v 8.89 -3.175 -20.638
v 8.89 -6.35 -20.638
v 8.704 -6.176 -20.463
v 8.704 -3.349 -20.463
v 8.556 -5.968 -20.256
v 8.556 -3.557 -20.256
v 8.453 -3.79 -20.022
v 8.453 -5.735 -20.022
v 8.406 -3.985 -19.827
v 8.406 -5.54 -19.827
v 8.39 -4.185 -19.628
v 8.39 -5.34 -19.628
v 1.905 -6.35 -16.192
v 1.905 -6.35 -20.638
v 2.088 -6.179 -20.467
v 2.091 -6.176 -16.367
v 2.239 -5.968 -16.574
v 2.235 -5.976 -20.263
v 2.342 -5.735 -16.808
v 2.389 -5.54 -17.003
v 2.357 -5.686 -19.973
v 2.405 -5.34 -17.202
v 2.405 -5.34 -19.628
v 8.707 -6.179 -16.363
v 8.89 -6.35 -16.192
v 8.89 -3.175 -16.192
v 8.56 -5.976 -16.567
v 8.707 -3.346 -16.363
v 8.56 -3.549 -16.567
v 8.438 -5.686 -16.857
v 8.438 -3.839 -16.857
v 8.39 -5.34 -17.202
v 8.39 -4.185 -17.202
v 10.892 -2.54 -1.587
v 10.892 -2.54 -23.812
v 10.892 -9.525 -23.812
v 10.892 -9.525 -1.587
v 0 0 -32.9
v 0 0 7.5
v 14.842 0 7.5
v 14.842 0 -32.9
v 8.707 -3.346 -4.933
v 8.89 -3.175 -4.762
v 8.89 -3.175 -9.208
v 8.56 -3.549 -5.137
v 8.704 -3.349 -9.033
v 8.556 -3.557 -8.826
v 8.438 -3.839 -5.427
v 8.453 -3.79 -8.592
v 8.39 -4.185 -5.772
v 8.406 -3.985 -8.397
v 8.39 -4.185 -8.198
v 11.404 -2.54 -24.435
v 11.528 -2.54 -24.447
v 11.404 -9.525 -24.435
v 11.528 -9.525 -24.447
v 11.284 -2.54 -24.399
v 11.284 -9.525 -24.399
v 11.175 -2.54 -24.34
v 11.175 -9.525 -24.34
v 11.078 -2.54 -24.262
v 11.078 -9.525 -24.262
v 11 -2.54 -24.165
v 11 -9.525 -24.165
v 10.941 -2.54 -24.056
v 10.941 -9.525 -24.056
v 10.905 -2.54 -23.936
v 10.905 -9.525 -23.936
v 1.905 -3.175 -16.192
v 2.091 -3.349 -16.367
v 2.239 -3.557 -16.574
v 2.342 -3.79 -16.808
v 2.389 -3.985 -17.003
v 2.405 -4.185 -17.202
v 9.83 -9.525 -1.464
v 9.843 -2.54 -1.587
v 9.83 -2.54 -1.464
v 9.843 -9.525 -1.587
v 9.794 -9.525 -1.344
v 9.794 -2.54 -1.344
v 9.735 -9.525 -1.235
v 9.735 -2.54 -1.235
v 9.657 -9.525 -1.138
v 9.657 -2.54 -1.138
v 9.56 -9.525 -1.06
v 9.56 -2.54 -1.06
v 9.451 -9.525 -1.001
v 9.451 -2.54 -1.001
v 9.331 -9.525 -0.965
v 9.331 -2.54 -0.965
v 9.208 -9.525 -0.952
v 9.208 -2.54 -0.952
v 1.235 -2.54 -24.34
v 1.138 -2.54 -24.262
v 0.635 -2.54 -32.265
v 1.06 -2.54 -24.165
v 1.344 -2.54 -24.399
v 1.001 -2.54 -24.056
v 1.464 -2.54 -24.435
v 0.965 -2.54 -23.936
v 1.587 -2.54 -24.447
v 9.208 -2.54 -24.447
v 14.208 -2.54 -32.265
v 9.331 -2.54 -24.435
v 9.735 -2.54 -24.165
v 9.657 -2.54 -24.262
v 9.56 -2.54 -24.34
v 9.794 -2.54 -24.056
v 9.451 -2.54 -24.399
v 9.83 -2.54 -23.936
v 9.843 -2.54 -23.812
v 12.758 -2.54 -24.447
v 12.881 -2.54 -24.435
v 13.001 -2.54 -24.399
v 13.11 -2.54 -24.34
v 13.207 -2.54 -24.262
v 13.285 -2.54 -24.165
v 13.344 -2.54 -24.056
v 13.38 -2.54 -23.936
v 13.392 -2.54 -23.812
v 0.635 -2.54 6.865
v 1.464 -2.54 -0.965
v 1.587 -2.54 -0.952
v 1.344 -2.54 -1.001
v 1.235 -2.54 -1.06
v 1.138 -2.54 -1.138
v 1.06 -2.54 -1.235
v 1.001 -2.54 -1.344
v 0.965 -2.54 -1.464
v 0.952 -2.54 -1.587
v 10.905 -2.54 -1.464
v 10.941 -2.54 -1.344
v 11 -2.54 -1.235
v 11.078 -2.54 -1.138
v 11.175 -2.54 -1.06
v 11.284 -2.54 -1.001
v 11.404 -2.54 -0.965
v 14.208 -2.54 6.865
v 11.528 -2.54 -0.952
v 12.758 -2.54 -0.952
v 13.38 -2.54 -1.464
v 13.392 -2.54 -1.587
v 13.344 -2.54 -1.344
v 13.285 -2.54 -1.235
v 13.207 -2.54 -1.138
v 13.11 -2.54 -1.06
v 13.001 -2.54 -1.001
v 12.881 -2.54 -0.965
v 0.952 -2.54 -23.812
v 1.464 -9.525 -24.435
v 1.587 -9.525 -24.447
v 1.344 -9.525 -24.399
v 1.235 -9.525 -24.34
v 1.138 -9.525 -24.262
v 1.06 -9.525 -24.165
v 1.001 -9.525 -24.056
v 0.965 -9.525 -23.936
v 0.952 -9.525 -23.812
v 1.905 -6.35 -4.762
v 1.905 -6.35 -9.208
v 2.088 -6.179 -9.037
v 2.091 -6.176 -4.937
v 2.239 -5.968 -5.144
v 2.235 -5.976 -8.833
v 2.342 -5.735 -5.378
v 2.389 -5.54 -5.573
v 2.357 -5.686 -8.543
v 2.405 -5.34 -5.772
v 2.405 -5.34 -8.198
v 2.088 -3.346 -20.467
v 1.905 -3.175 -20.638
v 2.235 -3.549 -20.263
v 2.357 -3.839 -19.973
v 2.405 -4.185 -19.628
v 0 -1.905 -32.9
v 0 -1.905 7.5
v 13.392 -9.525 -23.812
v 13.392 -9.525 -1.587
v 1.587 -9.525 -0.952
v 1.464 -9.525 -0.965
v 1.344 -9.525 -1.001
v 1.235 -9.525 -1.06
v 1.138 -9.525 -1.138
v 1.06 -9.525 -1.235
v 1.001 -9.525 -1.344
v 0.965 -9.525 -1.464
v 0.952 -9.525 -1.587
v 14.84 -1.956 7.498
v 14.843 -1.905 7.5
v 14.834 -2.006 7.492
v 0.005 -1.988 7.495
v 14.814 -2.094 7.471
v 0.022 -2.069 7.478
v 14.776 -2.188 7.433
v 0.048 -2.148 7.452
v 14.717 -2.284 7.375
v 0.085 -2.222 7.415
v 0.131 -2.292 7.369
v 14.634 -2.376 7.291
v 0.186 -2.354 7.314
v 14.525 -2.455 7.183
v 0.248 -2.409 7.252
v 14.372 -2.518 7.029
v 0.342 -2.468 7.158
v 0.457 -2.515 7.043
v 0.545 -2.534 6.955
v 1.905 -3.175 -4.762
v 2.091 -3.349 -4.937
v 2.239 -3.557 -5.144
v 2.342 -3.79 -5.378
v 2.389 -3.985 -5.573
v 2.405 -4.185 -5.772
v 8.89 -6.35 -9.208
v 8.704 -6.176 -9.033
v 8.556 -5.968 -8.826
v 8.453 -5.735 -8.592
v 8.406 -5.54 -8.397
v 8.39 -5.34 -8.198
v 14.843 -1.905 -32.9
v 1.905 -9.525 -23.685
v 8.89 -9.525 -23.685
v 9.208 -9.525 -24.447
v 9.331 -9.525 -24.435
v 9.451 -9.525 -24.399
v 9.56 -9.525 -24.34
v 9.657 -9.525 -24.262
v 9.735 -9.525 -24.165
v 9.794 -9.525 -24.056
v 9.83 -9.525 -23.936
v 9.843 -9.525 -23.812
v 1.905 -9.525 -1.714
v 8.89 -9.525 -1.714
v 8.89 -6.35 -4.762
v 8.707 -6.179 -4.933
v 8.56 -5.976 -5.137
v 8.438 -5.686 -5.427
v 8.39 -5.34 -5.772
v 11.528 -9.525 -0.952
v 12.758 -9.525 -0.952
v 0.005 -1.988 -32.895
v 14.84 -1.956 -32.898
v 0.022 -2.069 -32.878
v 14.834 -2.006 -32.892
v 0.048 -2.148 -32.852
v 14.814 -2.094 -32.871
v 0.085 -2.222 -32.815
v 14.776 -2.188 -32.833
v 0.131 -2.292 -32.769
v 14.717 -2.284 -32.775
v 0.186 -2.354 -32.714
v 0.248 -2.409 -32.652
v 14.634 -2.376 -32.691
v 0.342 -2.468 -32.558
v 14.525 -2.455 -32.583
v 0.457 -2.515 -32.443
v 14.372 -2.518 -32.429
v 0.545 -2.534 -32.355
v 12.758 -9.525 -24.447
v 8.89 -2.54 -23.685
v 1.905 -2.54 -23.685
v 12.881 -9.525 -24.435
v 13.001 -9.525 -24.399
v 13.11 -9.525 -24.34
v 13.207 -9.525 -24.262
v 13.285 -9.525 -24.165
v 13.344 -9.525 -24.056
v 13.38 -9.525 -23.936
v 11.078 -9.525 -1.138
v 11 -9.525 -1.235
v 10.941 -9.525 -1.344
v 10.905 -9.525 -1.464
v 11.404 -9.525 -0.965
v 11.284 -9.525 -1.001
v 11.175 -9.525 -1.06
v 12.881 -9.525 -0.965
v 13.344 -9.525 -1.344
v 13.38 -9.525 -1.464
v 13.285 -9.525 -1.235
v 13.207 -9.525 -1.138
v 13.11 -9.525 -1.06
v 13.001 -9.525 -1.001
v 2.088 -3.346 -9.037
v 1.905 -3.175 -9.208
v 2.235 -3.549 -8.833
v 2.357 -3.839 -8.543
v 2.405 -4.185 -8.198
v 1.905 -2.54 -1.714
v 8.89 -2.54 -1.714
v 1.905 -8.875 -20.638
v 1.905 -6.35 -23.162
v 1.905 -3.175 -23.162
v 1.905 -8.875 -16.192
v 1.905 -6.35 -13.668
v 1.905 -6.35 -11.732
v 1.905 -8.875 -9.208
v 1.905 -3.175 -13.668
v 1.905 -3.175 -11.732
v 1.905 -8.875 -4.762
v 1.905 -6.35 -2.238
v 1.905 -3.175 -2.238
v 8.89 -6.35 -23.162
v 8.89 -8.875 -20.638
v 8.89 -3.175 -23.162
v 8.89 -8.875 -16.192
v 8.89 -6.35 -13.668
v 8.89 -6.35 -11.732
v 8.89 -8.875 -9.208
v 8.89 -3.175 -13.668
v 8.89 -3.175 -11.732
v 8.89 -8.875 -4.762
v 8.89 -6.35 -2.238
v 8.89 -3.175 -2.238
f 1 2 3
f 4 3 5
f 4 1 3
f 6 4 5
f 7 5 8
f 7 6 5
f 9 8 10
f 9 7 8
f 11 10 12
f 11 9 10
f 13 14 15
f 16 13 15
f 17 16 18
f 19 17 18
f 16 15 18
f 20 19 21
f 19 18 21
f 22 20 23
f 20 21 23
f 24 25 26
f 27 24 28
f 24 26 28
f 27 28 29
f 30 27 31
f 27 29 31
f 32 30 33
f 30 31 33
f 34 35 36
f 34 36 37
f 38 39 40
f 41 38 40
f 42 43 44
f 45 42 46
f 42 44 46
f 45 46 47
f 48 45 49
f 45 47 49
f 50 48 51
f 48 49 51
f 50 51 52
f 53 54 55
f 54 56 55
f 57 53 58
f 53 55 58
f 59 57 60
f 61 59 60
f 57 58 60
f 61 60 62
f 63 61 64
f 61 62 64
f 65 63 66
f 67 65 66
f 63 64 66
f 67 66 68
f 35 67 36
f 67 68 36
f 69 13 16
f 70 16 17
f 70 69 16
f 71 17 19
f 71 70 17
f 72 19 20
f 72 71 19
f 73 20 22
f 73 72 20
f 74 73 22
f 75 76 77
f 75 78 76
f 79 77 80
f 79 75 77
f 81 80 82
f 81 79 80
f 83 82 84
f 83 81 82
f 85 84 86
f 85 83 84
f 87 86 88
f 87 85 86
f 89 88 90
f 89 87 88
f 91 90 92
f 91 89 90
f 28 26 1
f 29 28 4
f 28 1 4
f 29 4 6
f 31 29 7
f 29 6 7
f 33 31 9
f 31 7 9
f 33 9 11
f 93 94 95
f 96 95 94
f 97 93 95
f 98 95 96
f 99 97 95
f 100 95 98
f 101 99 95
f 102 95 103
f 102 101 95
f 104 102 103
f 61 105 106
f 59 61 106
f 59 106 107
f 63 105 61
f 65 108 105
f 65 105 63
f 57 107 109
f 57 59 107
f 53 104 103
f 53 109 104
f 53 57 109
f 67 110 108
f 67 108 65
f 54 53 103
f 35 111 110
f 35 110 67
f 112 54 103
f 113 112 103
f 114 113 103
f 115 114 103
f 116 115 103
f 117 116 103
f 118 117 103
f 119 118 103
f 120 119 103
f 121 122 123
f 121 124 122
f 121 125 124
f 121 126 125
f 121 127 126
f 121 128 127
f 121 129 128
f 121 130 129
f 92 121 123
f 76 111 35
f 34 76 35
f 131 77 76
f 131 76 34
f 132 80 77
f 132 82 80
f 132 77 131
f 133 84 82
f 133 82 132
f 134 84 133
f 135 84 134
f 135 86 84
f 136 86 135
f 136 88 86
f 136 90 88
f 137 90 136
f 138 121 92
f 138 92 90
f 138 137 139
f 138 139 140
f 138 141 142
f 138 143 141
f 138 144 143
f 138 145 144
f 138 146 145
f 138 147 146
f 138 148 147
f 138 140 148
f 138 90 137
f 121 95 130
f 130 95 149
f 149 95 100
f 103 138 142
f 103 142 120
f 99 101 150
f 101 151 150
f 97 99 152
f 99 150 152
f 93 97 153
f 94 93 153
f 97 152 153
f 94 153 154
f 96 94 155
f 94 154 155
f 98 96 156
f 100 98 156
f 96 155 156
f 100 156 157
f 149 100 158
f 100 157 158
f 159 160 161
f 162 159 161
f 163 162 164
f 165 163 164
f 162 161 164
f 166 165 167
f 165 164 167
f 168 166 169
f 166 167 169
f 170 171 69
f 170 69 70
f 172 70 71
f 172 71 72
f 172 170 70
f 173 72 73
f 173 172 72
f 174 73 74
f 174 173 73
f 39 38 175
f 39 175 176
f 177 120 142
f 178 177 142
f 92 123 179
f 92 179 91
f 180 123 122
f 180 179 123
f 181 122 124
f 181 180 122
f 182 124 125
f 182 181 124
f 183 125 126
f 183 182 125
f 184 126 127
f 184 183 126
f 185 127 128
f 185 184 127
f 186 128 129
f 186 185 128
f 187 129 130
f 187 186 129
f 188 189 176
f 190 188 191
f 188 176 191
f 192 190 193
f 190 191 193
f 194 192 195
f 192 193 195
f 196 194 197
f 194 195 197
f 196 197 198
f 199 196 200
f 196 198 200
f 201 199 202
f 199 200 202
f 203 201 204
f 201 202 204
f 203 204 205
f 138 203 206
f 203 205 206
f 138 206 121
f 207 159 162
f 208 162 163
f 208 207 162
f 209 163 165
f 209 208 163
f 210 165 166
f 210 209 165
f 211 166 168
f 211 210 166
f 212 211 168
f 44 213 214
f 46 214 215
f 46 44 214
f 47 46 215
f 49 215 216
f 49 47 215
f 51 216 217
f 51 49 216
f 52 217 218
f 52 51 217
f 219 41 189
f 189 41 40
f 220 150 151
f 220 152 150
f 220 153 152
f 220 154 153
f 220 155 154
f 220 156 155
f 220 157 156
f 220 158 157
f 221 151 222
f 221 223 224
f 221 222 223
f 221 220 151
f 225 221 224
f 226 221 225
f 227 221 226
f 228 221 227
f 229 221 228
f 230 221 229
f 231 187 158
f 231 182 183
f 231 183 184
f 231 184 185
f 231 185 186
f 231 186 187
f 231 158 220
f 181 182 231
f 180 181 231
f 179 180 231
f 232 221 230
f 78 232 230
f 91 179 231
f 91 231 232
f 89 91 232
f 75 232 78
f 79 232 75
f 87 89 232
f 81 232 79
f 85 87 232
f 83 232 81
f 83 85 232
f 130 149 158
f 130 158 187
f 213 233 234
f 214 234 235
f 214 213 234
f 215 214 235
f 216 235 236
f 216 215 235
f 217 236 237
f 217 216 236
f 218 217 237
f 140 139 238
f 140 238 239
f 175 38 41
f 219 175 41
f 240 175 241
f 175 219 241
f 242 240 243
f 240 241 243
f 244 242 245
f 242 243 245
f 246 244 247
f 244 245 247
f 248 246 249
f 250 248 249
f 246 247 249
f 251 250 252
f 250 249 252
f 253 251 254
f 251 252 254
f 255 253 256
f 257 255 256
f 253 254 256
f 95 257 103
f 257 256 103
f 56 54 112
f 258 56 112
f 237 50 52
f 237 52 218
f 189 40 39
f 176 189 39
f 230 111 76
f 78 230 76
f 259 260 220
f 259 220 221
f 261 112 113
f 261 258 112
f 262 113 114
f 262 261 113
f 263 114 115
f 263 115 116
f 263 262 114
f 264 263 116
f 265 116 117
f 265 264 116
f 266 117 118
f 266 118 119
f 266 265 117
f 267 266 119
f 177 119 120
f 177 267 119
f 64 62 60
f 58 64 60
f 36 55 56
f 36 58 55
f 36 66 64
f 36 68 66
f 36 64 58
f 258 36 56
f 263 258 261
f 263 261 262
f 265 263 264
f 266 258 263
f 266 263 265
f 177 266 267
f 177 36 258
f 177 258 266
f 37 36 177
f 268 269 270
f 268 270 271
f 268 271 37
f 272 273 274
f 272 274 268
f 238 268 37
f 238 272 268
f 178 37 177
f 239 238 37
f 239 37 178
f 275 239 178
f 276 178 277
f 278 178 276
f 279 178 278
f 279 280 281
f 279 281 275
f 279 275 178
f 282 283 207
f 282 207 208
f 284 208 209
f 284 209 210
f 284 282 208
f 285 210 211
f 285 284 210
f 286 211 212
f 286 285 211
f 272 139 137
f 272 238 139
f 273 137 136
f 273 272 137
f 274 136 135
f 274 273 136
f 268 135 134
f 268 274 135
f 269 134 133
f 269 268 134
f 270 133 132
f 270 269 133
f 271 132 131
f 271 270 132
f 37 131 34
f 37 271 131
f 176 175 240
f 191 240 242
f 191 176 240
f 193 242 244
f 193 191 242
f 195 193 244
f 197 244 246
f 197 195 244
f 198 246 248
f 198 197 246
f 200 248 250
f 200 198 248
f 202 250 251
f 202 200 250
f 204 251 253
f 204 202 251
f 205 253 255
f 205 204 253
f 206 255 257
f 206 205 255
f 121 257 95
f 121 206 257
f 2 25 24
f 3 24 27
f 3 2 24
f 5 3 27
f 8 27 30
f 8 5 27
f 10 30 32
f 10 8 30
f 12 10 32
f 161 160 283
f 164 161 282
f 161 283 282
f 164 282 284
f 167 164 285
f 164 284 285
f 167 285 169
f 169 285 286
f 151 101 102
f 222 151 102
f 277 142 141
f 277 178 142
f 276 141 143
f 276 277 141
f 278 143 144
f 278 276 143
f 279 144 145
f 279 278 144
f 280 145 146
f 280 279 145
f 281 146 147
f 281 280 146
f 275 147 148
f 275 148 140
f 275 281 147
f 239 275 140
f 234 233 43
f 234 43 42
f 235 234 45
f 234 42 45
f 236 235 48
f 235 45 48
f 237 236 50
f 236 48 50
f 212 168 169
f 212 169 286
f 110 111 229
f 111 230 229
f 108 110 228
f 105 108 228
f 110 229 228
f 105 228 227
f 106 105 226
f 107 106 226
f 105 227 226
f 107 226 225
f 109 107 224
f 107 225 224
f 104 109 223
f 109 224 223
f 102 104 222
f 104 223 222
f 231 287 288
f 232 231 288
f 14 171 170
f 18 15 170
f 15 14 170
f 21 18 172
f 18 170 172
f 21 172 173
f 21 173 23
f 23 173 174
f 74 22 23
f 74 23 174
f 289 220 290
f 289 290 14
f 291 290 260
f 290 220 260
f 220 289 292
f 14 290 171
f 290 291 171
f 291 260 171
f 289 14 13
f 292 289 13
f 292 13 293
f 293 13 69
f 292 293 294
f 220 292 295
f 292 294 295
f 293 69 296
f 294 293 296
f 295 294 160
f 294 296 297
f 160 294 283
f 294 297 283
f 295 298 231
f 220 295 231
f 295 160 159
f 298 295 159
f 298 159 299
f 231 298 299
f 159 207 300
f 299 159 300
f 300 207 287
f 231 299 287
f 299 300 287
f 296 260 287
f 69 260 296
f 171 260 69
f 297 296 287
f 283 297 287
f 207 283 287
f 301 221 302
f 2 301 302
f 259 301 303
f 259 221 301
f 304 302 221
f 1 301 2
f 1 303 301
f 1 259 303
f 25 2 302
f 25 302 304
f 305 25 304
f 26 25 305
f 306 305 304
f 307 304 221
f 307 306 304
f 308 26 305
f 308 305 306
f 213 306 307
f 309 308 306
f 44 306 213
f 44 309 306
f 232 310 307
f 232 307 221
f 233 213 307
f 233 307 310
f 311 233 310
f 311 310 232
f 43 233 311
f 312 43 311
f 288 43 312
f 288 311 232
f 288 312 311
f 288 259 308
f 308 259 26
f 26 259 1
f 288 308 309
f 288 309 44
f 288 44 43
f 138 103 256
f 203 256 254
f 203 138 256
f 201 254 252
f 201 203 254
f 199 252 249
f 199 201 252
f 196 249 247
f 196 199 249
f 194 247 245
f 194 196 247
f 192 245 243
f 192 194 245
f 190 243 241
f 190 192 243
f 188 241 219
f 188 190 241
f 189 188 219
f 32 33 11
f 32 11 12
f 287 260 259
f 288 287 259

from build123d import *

# Parameters (mm, degrees)
F0_W        = 10.795
F0_H        = 25.4
F1_DEPTH    = 2.54
F2_W        = 8.89
F2_H        = 23.495
F2_W_2      = 6.985
F2_H_2      = 21.971
F3_DEPTH    = 6.985
F4_W        = 3.175
F4_H        = 4.445
F5_DEPTH    = 0.5
F6_W        = 3.175
F6_H        = 4.445
F7_DEPTH    = 0.5
F8_T1_DEPTH = 5.6998762346
F8_T3_DEPTH = 9.4947524692
F8_T5_DEPTH = 9.4947524692
F9_W        = 10.795
F9_H        = 7.5
F10_DEPTH   = 2.54
F11_W       = 2.5
F11_H       = 23.495
F12_DEPTH   = 6.985
F13_R       = 0.635


# Not quite as in the source:
# - a fillet or chamfer that OpenCascade refuses, or shapes differently, is made with other operations: its cross-section is extruded or revolved along the edge and cut away or added


with BuildPart() as f1:
    # F0 (on Front) → F1 (new body)
    with BuildSketch(Plane.XZ):
        with Locations((5.3975, -12.7)):
            Rectangle(F0_W, F0_H)
    extrude(amount=F1_DEPTH)

    # F2 (on face) → F3 (join)
    with BuildSketch(Plane.XZ.offset(2.54)):
        with Locations((5.3975, -12.7)):
            Rectangle(F2_W, F2_H)
        with Locations((5.3975, -12.7)):
            Rectangle(F2_W_2, F2_H_2, mode=Mode.SUBTRACT)
    extrude(amount=F3_DEPTH)

    # F4 (on face) → F5 (join)
    with BuildSketch(Plane.YZ.offset(1.905)):
        with Locations((-4.7625, -6.985)):
            Rectangle(F4_W, F4_H)
        with Locations((-4.7625, -18.415)):
            Rectangle(F4_W, F4_H)
    extrude(amount=F5_DEPTH)

    # F6 (on face) → F7 (join)
    with BuildSketch(Plane(origin=(8.89, 0, 0), x_dir=(0, -1, 0), z_dir=(-1, 0, 0))):
        with Locations((4.7625, -6.985)):
            Rectangle(F6_W, F6_H)
        with Locations((4.7625, -18.415)):
            Rectangle(F6_W, F6_H)
    extrude(amount=F7_DEPTH)

    # F8: fillet of radius 1.27 on 16 edges, made by hand

    # F8_s2 → F8_t1 (cut)
    with BuildSketch(Plane.XZ.offset(3.175)):
        with BuildLine():
            ThreePointArc((1.905, -16.1925), (2.273156404, -16.6389791104), (2.405, -17.2024504938))
            Line((2.405, -17.2024504938), (2.405, -16.1925))
            Line((2.405, -16.1925), (1.905, -16.1925))
        make_face()
        with BuildLine():
            ThreePointArc((1.905, -20.6375), (2.273156404, -20.1910208896), (2.405, -19.6275495062))
            Line((2.405, -19.6275495062), (2.405, -20.6375))
            Line((2.405, -20.6375), (1.905, -20.6375))
        make_face()
        with BuildLine():
            ThreePointArc((1.905, -4.7625), (2.273156404, -5.2089791104), (2.405, -5.7724504938))
            Line((2.405, -5.7724504938), (2.405, -4.7625))
            Line((2.405, -4.7625), (1.905, -4.7625))
        make_face()
        with BuildLine():
            ThreePointArc((1.905, -9.2075), (2.273156404, -8.7610208896), (2.405, -8.1975495062))
            Line((2.405, -8.1975495062), (2.405, -9.2075))
            Line((2.405, -9.2075), (1.905, -9.2075))
        make_face()
        with BuildLine():
            ThreePointArc((8.89, -4.7625), (8.521843596, -5.2089791104), (8.39, -5.7724504938))
            Line((8.39, -5.7724504938), (8.39, -4.7625))
            Line((8.39, -4.7625), (8.89, -4.7625))
        make_face()
        with BuildLine():
            ThreePointArc((8.89, -9.2075), (8.521843596, -8.7610208896), (8.39, -8.1975495062))
            Line((8.39, -8.1975495062), (8.39, -9.2075))
            Line((8.39, -9.2075), (8.89, -9.2075))
        make_face()
        with BuildLine():
            ThreePointArc((8.89, -16.1925), (8.521843596, -16.6389791104), (8.39, -17.2024504938))
            Line((8.39, -17.2024504938), (8.39, -16.1925))
            Line((8.39, -16.1925), (8.89, -16.1925))
        make_face()
        with BuildLine():
            ThreePointArc((8.89, -20.6375), (8.521843596, -20.1910208896), (8.39, -19.6275495062))
            Line((8.39, -19.6275495062), (8.39, -20.6375))
            Line((8.39, -20.6375), (8.89, -20.6375))
        make_face()
    extrude(amount=F8_T1_DEPTH, mode=Mode.SUBTRACT)

    # F8_s4 → F8_t3 (cut)
    with BuildSketch(Plane.XY.offset(-23.1623762346)):
        with BuildLine():
            ThreePointArc((1.905, -6.35), (2.273156404, -5.9035208896), (2.405, -5.3400495062))
            Line((2.405, -5.3400495062), (2.405, -6.35))
            Line((2.405, -6.35), (1.905, -6.35))
        make_face()
        with BuildLine():
            ThreePointArc((1.905, -3.175), (2.273156404, -3.6214791104), (2.405, -4.1849504938))
            Line((2.405, -4.1849504938), (2.405, -3.175))
            Line((2.405, -3.175), (1.905, -3.175))
        make_face()
        with BuildLine():
            ThreePointArc((8.89, -3.175), (8.521843596, -3.6214791104), (8.39, -4.1849504938))
            Line((8.39, -4.1849504938), (8.39, -3.175))
            Line((8.39, -3.175), (8.89, -3.175))
        make_face()
        with BuildLine():
            ThreePointArc((8.89, -6.35), (8.521843596, -5.9035208896), (8.39, -5.3400495062))
            Line((8.39, -5.3400495062), (8.39, -6.35))
            Line((8.39, -6.35), (8.89, -6.35))
        make_face()
    extrude(amount=F8_T3_DEPTH, mode=Mode.SUBTRACT)

    # F8_s6 → F8_t5 (cut)
    with BuildSketch(Plane.XY.offset(-11.7323762346)):
        with BuildLine():
            ThreePointArc((1.905, -6.35), (2.273156404, -5.9035208896), (2.405, -5.3400495062))
            Line((2.405, -5.3400495062), (2.405, -6.35))
            Line((2.405, -6.35), (1.905, -6.35))
        make_face()
        with BuildLine():
            ThreePointArc((1.905, -3.175), (2.273156404, -3.6214791104), (2.405, -4.1849504938))
            Line((2.405, -4.1849504938), (2.405, -3.175))
            Line((2.405, -3.175), (1.905, -3.175))
        make_face()
        with BuildLine():
            ThreePointArc((8.89, -3.175), (8.521843596, -3.6214791104), (8.39, -4.1849504938))
            Line((8.39, -4.1849504938), (8.39, -3.175))
            Line((8.39, -3.175), (8.89, -3.175))
        make_face()
        with BuildLine():
            ThreePointArc((8.89, -6.35), (8.521843596, -5.9035208896), (8.39, -5.3400495062))
            Line((8.39, -5.3400495062), (8.39, -6.35))
            Line((8.39, -6.35), (8.89, -6.35))
        make_face()
    extrude(amount=F8_T5_DEPTH, mode=Mode.SUBTRACT)

    # F9 (on Front) → F10 (join)
    with BuildSketch(Plane.XZ):
        with Locations((5.3975, 3.75)):
            Rectangle(F9_W, F9_H)
        Polygon((10.795, 7.5), (10.795, 0), (10.795, -25.4), (10.795, -32.9), (14.8425, -32.9), (14.8425, 7.5), align=None)
        with Locations((5.3975, -29.15)):
            Rectangle(F9_W, F9_H)
    extrude(amount=F10_DEPTH)

    # F11 (on face) → F12 (join)
    with BuildSketch(Plane.XZ.offset(2.54)):
        with Locations((12.1425, -12.7)):
            Rectangle(F11_W, F11_H)
    extrude(amount=F12_DEPTH)

    # F13
    f13_edges = [f1.edges().sort_by_distance(p)[0] for p in [
        (0.9525, -6.0325, -0.9525),
        (9.8425, -6.0325, -0.9525),
        (9.8425, -6.0325, -24.4475),
        (0.9525, -6.0325, -24.4475),
        (0, -2.54, -12.7),
        (10.8925, -6.0325, -24.4475),
        (13.3925, -6.0325, -24.4475),
        (10.8925, -6.0325, -0.9525),
        (13.3925, -6.0325, -0.9525),
        (14.8425, -2.54, -12.7),
        (7.42125, -2.54, -32.9),
        (7.42125, -2.54, 7.5),
    ]]
    fillet(f13_edges, radius=F13_R)


solid = f1.part
